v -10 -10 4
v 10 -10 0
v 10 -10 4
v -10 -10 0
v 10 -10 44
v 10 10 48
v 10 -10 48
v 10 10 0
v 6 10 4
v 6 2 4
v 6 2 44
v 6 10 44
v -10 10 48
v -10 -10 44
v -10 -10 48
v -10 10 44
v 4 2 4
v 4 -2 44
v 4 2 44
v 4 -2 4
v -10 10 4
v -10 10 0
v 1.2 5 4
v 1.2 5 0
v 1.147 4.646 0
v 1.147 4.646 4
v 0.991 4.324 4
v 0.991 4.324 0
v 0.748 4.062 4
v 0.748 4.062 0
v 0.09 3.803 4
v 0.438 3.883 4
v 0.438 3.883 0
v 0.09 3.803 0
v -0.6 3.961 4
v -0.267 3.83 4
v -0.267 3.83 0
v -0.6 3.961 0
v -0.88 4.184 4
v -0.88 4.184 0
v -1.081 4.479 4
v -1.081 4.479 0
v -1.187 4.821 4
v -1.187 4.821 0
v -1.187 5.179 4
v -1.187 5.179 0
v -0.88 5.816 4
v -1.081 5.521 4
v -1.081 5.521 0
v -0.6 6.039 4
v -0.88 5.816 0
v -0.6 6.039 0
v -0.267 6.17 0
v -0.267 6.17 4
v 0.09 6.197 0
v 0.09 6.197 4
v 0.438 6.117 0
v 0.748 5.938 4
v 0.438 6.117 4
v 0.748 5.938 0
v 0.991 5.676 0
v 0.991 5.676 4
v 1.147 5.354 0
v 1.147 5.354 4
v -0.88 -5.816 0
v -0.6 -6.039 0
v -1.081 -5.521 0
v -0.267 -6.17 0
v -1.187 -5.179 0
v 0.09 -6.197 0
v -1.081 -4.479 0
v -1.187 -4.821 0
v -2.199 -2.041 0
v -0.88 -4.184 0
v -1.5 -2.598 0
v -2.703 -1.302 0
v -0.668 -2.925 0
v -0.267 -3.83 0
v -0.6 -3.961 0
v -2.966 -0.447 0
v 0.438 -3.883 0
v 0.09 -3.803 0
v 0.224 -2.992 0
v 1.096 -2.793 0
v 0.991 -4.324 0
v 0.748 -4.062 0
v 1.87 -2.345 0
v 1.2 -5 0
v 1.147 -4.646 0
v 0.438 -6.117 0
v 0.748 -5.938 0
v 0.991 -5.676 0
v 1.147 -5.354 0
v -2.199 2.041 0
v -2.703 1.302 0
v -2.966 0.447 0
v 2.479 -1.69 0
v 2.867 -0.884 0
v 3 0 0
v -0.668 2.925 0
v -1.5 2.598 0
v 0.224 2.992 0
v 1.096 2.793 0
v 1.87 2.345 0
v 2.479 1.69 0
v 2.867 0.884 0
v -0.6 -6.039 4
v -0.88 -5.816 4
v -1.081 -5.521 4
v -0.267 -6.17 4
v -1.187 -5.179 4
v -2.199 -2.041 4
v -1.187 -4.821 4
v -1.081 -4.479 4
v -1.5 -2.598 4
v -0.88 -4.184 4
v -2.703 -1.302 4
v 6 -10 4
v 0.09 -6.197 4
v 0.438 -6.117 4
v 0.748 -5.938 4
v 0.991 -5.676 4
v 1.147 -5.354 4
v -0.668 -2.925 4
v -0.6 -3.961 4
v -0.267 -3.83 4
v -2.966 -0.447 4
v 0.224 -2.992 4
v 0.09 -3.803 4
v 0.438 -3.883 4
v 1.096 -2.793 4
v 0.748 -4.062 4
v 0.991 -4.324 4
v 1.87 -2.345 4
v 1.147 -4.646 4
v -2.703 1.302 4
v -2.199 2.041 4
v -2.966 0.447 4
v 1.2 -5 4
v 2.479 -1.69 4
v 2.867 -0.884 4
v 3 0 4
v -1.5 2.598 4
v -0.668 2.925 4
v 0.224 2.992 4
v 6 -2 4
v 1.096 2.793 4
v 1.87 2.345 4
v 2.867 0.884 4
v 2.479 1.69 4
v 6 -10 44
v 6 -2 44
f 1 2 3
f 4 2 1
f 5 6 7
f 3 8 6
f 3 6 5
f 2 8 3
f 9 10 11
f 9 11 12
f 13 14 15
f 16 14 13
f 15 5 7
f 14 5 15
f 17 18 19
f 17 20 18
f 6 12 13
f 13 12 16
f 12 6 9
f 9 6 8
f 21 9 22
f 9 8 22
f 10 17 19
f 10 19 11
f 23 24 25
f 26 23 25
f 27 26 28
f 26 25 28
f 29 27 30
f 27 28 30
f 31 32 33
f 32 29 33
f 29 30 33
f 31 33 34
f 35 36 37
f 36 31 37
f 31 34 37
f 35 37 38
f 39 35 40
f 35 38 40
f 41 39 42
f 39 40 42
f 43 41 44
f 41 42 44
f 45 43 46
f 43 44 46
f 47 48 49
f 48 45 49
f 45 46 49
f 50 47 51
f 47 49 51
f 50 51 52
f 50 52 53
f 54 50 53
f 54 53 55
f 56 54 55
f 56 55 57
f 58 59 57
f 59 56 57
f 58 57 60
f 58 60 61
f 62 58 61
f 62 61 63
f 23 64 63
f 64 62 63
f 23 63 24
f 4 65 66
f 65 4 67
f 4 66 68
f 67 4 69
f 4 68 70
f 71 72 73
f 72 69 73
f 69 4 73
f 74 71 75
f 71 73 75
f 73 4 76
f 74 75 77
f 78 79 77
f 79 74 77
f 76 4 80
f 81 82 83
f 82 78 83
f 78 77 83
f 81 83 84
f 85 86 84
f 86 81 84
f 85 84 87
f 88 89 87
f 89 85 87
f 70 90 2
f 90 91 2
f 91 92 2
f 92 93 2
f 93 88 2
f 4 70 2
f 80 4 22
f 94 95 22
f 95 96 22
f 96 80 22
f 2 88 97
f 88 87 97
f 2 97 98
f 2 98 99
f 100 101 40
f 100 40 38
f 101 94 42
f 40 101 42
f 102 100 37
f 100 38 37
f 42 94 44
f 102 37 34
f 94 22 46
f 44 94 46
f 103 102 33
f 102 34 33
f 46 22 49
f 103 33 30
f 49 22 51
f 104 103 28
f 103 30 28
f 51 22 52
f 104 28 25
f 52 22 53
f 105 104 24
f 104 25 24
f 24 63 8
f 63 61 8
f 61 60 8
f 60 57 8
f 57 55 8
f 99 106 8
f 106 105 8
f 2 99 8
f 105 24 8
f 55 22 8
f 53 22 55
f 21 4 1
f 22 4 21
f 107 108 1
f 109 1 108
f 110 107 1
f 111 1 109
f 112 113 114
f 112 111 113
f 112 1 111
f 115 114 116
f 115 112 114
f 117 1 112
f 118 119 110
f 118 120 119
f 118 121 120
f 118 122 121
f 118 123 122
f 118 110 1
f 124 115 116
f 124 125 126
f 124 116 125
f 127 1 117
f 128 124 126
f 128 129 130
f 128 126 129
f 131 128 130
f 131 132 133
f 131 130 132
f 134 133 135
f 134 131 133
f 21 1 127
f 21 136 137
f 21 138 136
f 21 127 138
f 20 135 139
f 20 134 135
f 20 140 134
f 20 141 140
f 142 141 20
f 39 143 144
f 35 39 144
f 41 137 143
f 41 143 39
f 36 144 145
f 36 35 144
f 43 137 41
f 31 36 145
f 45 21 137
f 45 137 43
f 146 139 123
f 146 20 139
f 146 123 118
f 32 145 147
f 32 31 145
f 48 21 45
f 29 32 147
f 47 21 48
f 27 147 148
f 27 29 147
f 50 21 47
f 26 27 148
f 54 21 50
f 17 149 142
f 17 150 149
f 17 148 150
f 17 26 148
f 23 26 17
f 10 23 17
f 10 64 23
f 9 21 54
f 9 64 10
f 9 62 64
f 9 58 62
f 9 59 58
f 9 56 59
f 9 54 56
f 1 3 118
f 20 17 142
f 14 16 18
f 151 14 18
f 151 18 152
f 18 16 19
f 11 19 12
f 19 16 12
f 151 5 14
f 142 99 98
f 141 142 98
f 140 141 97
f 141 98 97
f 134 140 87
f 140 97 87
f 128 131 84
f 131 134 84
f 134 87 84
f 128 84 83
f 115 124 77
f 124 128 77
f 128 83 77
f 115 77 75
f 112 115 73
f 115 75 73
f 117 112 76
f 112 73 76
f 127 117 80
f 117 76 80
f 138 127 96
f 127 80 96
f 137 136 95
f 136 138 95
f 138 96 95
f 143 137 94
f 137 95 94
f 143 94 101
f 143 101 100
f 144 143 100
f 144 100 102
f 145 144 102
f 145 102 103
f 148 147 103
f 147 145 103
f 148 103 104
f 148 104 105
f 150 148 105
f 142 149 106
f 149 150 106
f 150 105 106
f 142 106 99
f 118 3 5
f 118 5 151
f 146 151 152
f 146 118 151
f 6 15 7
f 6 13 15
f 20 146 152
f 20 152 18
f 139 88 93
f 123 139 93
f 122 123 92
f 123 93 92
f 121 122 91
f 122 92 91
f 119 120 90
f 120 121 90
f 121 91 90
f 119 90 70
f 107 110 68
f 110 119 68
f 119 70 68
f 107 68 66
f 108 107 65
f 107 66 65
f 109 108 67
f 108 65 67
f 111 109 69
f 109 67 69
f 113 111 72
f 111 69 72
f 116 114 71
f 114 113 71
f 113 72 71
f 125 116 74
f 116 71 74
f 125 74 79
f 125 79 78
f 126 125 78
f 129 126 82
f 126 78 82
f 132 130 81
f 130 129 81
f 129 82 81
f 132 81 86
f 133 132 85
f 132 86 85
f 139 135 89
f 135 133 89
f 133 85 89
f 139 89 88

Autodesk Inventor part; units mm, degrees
ref_plane "YZ Plane" through (0, 0, 0) normal (1, 0, 0) x (0, 1, 0)
ref_plane "XZ Plane" through (0, 0, 0) normal (0, 1, 0) x (-1, 0, 0)
ref_plane "XY Plane" through (0, 0, 0) normal (0, 0, 1) x (1, 0, 0)
sketch "Sketch1" plane through (0, 0, 0) normal (0, 0, 1) x (1, 0, 0)
  line L0 (10, -10) -> (-10, -10)
  line L1 (-10, -10) -> (-10, 10)
  line L2 (-10, 10) -> (10, 10)
  line L3 (10, 10) -> (10, -10)
  circle A0 centre (0, 5) radius 1.2
  circle A1 centre (0, -5) radius 1.2
  circle A2 centre (0, 0) radius 3
  dimension "d0" = 10
  dimension "d1" = 10
  dimension "d2" = 10
  dimension "d3" = 10
  dimension "d4" = 5
  dimension "d5" = 5
  dimension "d6" = 2.4
  dimension "d7" = 2.4
  dimension "d8" = 6
extrude "Extrusion1" add sketch "Sketch1" along normal blind 4
sketch "Sketch2" plane through (0, 0, 4) normal (0, 0, 1) x (1, 0, 0)
  line L0 (0, 0) -> (-1.3346, -1.3533)
  line L1 (10, 10) -> (-10, 10) projected
  line L2 (10, -9.9996) -> (6, -9.9996)
  line L3 (6, -9.9996) -> (6, 10)
  line L4 (6, 10) -> (10, 10)
  line L5 (10, 10) -> (10, -9.9996)
  line L6 (8, -1.9998) -> (4, -1.9998)
  line L7 (4, -1.9998) -> (4, 2.0002)
  line L8 (4, 2.0002) -> (8, 2.0002)
  line L9 (8, 2.0002) -> (8, -1.9998)
  line L10 (8, -1.9998) -> (4, 2.0002) construction
  line L11 (4, -1.9998) -> (8, 2.0002) construction
  point P0 (6, 0.0002)
  point P1 (6, -1.9998)
  point P2 (6, 2.0002)
  dimension "d19" = 6
  dimension "d20" = 10
  dimension "d21" = 4
  dimension "d22" = 4
extrude "Extrusion2" add sketch "Sketch2" along normal blind 40
sketch "Sketch3" plane through (0, 0, 44) normal (0, 0, 1) x (1, 0, 0)
  line L0 (10, 10) -> (-10, 10) projected
  line L1 (10, -10) -> (-10, -10)
  line L2 (-10, -10) -> (-10, 10)
  line L3 (-10, 10) -> (10, 10)
  line L4 (10, 10) -> (10, -10)
  line L5 (10, -10) -> (-10, 10) construction
  line L6 (-10, -10) -> (10, 10) construction
  point P0 (0, 0)
extrude "Extrusion3" add sketch "Sketch3" along normal blind 4
equation "\"d1\" = d0"
equation "\"d2\" = d0"
equation "\"d3\" = d2"
equation "\"d5\" = d4"
equation "\"d7\" = d6"
properties part number "MotorMount"
